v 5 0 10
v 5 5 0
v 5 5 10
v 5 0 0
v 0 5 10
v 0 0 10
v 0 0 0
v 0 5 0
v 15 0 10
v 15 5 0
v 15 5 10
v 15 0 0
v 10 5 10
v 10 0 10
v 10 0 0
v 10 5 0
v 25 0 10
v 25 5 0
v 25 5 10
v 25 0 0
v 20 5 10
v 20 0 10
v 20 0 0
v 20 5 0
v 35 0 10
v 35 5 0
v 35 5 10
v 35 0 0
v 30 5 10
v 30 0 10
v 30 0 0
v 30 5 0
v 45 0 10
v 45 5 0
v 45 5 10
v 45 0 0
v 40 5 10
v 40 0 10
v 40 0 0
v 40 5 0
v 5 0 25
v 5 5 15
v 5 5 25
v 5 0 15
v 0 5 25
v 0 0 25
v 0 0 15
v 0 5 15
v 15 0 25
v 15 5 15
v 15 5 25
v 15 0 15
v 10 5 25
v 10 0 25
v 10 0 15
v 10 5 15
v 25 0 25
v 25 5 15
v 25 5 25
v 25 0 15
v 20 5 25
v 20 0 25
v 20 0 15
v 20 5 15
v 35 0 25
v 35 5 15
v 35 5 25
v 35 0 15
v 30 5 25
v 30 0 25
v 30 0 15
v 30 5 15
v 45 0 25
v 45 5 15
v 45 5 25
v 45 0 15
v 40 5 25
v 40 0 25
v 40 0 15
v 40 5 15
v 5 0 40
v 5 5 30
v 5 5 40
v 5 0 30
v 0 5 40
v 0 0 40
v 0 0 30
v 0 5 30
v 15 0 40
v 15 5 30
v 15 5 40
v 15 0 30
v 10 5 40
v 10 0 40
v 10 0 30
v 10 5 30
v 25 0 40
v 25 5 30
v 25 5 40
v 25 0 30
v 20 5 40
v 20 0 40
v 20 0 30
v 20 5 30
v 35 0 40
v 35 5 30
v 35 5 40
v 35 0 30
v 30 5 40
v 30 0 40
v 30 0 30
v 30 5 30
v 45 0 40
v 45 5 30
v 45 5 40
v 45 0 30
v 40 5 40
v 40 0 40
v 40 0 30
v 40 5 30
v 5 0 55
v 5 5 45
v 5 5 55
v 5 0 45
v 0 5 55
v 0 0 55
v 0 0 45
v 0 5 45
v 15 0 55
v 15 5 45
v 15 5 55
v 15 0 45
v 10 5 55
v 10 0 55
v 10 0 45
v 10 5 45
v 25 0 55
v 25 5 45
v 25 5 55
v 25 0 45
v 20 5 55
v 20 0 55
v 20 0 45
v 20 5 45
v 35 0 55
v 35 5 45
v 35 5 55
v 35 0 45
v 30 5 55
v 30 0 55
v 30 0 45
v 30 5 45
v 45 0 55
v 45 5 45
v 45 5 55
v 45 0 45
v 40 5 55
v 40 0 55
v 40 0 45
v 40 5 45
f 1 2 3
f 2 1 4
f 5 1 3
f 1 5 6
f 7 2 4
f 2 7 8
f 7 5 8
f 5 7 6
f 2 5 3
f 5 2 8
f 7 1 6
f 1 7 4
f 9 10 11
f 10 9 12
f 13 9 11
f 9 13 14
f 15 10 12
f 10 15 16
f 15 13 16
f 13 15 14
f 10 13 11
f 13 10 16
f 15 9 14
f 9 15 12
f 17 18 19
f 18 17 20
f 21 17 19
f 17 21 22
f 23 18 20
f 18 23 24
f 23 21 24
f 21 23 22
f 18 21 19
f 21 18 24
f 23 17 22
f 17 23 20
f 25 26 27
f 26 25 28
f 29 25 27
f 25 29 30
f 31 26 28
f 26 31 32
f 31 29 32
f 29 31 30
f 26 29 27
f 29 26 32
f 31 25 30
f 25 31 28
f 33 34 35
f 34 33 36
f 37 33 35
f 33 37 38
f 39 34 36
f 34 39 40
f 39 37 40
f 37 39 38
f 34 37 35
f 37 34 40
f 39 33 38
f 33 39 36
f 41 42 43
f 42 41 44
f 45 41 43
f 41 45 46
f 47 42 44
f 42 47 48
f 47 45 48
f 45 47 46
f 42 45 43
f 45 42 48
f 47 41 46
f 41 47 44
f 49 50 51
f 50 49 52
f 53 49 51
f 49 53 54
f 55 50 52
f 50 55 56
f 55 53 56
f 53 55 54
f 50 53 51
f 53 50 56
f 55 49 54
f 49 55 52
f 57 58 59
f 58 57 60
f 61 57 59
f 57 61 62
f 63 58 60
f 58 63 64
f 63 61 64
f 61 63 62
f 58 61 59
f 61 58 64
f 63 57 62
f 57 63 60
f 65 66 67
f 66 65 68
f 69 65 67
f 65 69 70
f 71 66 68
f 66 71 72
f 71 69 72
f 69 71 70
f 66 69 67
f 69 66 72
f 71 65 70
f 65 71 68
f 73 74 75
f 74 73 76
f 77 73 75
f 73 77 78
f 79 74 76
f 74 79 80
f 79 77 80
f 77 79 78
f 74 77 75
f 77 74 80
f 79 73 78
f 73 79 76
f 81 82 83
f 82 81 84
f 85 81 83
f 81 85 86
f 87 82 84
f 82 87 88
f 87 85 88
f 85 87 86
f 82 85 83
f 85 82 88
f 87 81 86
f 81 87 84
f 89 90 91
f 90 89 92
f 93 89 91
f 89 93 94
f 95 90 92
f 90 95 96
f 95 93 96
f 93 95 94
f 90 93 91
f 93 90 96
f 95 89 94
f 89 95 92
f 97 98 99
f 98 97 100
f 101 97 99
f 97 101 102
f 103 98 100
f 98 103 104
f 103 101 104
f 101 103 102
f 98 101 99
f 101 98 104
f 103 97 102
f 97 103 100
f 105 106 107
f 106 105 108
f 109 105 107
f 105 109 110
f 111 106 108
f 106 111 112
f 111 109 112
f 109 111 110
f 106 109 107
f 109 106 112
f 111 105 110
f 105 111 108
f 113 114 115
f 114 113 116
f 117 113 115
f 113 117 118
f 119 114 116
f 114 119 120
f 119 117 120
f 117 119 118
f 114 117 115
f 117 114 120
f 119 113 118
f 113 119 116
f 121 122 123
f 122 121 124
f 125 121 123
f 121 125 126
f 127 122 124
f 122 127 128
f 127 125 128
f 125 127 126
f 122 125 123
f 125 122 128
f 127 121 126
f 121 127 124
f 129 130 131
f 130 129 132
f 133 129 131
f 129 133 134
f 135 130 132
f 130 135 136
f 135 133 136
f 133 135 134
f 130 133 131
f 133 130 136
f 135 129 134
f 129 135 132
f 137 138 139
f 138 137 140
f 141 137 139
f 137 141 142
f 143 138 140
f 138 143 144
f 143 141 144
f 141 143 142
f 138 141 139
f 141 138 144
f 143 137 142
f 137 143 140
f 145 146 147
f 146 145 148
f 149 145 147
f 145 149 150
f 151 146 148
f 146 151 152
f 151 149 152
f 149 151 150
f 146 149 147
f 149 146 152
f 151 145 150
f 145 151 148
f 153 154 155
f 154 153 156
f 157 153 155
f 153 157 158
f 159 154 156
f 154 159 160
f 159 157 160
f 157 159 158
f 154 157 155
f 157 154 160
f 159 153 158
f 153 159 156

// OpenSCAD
for(z=[0:15:45]){
  for(x=[0:10:40]){
    translate([x,0,z])cube([5,5,10]);
  }
}
